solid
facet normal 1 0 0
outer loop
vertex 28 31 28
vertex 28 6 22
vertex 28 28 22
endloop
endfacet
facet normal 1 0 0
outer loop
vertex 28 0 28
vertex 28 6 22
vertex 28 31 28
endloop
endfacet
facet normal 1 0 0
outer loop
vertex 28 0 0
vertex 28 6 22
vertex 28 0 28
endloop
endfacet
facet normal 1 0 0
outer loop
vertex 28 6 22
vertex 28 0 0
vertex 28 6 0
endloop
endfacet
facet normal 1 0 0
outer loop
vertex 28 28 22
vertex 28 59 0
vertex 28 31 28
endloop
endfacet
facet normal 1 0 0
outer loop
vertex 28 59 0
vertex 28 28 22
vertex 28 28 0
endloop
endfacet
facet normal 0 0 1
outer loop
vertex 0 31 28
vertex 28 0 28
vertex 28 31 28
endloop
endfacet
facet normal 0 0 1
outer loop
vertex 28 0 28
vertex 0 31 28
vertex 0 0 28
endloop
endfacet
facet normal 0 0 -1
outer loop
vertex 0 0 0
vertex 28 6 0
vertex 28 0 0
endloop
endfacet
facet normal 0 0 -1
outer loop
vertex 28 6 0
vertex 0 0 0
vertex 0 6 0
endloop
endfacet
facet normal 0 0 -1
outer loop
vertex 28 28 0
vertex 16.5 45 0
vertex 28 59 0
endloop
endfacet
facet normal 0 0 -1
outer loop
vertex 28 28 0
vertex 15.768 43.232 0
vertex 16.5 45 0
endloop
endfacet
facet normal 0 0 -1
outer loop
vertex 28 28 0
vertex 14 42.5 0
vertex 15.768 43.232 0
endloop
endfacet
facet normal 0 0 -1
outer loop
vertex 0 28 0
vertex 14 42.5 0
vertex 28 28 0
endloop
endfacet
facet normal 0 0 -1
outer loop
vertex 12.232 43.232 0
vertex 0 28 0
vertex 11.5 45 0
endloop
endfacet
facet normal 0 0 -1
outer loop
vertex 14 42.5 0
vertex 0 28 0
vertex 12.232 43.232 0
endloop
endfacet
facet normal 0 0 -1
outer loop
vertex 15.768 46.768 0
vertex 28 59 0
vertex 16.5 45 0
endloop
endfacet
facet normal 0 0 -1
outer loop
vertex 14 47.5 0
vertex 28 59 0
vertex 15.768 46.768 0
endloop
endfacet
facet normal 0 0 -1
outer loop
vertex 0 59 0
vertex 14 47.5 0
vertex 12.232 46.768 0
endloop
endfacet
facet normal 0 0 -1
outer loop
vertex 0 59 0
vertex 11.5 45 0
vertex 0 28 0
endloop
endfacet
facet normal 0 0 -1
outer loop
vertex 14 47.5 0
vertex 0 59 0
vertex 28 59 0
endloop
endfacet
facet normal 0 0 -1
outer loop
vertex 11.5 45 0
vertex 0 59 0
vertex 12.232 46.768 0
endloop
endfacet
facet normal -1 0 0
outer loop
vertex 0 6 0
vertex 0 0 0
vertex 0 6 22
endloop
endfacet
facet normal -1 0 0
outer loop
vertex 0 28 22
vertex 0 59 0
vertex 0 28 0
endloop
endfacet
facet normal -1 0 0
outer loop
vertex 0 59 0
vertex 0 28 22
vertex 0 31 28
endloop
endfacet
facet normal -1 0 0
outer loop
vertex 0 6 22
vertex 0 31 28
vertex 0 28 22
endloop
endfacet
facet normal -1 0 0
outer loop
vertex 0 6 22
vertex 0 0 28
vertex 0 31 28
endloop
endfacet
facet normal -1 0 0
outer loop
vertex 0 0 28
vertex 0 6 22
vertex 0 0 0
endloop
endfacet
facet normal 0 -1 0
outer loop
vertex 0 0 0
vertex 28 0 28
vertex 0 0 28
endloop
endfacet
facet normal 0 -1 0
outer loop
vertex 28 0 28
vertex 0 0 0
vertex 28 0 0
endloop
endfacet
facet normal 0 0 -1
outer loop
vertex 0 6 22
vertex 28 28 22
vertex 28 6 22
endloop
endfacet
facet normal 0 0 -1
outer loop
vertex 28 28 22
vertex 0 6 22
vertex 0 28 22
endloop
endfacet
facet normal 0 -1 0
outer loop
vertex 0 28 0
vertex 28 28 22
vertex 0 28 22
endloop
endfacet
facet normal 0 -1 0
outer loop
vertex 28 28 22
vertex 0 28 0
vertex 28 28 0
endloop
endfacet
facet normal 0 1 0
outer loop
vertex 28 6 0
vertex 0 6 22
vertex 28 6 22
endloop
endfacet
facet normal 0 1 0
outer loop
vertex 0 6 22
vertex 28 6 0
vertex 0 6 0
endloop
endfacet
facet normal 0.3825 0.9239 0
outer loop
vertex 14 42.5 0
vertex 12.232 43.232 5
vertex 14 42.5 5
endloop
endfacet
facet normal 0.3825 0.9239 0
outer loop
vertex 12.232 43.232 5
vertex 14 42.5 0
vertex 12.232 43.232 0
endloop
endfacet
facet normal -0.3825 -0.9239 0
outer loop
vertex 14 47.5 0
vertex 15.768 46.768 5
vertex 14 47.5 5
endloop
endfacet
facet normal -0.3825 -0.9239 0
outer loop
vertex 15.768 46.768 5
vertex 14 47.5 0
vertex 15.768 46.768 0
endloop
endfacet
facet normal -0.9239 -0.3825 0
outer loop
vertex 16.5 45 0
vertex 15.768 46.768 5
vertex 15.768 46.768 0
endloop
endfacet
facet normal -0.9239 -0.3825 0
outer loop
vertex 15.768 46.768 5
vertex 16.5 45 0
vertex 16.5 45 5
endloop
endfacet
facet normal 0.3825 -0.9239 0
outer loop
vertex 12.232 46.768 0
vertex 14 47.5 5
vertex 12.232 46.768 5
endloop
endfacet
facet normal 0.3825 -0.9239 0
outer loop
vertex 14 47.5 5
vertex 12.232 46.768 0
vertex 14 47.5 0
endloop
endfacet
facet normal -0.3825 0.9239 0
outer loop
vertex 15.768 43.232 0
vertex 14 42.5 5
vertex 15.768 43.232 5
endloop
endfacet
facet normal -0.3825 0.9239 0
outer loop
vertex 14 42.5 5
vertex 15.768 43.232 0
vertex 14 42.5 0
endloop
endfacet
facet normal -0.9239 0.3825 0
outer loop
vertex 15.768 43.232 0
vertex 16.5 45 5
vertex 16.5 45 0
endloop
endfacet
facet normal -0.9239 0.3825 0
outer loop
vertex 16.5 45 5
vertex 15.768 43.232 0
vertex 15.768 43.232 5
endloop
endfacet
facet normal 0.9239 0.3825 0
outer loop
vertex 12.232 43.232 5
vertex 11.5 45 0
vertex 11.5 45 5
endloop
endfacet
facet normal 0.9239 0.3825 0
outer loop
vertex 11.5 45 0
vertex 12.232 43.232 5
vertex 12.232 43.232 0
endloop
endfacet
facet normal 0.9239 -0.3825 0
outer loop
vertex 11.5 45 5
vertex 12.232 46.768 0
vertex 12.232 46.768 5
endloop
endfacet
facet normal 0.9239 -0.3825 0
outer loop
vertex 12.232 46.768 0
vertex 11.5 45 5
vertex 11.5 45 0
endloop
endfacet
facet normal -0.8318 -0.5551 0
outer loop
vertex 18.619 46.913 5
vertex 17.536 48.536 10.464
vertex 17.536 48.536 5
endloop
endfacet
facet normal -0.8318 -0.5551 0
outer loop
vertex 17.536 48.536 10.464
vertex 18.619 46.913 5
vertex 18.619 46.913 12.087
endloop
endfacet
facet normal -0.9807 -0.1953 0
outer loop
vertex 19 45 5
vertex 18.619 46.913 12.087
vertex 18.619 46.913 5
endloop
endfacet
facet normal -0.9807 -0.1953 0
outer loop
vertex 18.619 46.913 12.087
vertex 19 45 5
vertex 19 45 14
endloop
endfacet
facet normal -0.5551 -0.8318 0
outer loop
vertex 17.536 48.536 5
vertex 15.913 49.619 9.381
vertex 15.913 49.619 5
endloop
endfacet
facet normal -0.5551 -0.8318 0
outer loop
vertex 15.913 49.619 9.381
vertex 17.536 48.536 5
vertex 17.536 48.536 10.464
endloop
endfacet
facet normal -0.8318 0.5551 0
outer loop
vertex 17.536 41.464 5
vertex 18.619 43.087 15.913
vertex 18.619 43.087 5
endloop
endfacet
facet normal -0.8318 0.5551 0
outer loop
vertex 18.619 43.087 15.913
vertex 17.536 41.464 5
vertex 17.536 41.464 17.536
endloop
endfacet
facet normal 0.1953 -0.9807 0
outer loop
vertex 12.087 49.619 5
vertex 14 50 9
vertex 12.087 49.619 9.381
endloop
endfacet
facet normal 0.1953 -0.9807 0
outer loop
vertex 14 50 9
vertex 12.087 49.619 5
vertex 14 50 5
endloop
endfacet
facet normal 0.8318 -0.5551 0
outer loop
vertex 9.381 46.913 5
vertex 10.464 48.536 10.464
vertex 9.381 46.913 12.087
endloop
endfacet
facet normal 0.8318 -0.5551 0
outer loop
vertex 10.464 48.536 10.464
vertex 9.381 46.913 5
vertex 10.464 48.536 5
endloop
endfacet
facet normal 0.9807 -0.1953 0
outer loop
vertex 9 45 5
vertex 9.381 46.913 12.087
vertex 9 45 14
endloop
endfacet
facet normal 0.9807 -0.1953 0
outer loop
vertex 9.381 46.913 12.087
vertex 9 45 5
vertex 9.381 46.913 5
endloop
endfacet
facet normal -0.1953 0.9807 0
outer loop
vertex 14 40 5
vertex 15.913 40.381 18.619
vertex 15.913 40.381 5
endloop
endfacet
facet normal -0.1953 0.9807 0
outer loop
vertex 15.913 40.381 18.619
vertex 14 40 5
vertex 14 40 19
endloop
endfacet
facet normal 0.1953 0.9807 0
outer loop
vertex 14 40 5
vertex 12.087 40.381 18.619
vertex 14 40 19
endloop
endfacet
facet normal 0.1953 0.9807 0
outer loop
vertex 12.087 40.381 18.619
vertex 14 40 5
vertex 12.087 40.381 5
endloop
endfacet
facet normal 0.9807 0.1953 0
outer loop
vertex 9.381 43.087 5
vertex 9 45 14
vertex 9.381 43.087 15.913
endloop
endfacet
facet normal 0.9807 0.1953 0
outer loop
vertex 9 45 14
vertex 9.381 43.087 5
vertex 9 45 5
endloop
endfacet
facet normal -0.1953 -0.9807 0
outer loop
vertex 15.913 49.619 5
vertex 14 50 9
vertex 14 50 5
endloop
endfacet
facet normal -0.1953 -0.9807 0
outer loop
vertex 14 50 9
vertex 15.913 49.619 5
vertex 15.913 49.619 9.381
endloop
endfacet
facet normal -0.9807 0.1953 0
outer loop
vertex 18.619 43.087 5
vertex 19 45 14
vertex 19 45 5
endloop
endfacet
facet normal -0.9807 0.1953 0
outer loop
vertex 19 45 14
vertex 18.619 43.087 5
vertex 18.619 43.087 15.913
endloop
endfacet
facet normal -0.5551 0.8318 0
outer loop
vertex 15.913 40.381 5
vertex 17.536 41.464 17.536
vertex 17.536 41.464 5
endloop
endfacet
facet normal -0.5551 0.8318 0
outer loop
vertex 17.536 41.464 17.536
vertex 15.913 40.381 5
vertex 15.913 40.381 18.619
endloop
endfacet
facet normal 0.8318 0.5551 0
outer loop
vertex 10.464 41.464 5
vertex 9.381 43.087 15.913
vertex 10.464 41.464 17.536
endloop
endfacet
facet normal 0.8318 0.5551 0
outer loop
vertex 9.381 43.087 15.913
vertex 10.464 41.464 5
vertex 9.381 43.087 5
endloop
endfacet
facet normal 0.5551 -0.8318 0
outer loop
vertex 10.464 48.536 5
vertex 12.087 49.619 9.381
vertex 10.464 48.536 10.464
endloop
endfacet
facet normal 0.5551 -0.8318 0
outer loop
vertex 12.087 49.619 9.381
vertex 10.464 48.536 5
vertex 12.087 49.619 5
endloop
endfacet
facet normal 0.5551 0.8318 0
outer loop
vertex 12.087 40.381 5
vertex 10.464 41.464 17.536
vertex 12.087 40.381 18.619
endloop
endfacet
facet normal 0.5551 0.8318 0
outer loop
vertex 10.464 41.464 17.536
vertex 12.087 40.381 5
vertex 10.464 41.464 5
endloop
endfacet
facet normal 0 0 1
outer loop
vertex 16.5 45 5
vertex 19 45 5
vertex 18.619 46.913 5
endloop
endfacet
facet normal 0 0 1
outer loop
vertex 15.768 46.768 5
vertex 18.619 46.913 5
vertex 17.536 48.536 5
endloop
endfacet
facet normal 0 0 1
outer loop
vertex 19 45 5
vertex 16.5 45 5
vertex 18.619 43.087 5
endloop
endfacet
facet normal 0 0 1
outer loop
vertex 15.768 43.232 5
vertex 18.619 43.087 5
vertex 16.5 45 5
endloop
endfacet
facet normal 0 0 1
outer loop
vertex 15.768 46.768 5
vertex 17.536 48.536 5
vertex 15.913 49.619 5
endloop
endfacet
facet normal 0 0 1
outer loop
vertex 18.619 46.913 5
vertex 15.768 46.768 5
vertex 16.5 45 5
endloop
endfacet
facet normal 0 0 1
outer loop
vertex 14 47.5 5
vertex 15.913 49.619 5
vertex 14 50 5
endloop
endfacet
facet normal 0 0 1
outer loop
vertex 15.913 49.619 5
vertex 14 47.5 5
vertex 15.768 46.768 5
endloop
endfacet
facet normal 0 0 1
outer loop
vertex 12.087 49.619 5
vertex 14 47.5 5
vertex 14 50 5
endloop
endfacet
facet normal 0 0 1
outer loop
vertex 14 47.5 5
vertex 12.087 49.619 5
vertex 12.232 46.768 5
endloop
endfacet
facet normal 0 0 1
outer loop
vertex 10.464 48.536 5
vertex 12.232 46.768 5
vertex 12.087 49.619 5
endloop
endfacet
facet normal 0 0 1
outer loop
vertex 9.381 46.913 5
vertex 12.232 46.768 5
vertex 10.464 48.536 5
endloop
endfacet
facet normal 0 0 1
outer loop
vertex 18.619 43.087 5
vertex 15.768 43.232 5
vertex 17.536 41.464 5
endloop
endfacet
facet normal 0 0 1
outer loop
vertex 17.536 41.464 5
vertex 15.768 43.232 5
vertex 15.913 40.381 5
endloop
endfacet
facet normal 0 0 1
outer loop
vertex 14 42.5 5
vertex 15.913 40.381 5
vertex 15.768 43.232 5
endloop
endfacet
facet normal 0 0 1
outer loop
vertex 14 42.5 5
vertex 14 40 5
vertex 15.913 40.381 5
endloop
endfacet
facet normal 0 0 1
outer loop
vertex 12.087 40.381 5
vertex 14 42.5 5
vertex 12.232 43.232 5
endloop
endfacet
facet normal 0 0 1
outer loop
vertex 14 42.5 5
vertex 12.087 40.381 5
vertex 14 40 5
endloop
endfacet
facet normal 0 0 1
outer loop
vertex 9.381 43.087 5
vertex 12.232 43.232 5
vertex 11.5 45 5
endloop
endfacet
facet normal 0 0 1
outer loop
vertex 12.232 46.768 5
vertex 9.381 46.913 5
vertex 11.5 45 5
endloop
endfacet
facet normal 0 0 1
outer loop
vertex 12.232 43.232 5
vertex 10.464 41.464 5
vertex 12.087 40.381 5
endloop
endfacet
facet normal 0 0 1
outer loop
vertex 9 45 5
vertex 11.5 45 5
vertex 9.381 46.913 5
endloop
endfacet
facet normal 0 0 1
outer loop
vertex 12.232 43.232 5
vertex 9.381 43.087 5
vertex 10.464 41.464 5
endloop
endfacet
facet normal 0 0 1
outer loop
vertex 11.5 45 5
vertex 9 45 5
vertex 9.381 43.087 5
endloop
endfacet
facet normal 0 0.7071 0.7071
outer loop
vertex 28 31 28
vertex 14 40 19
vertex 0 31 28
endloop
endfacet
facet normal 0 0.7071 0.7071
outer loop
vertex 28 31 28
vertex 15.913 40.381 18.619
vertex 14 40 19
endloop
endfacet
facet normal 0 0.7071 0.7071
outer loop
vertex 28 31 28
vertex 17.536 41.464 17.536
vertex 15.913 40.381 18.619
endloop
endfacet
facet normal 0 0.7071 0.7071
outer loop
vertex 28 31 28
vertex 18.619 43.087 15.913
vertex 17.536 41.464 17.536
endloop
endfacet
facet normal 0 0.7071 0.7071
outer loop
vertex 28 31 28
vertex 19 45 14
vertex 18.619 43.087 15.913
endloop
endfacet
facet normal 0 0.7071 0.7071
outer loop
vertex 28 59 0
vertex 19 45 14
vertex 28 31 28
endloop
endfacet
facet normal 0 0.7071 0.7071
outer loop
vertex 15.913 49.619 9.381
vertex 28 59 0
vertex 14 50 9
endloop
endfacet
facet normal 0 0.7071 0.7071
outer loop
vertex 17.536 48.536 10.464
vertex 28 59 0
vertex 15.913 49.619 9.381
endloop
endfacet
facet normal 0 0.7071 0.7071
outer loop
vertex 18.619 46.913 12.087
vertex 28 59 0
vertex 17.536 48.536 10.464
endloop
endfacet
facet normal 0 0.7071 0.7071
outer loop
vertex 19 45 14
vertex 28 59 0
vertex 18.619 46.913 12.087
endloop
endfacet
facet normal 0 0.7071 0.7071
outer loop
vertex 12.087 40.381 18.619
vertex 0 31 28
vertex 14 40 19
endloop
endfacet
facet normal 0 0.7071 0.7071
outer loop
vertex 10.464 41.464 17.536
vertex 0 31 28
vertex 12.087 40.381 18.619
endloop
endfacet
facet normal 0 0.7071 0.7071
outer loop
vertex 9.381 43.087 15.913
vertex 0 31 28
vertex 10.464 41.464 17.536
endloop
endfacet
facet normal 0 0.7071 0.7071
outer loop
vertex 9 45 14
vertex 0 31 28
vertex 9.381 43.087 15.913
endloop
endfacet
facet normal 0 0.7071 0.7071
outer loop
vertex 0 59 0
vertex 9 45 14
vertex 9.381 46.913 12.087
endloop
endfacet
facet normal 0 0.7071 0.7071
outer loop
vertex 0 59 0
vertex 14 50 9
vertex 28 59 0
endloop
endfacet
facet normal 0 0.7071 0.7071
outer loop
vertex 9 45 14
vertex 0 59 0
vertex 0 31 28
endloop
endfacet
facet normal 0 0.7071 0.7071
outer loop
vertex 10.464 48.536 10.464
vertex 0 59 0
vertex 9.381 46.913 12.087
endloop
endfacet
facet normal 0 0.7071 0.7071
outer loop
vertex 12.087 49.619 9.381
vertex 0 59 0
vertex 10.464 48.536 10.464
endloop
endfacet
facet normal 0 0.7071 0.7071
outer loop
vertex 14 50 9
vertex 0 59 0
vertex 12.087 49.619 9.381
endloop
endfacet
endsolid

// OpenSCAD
thickness = 6;
clamp_height = 22;
clamp_width = 22;
clamp_depth = 28;

height = clamp_height + thickness;
width = clamp_width + 1.5 * thickness;
depth = clamp_depth;

screw_dia = 5;
screw_head_dia = 10;
screw_lip_height = 5;

mount_height = height;
mount_depth = clamp_depth;
mount_width = clamp_depth;


union() {
    difference() {
        cube([depth, width, height]);
        translate([-1, thickness, -1])
            cube([clamp_depth + 2, clamp_width, clamp_height + 1]);
    }
    translate([0, width, 0])
    difference() {
        polyhedron(points = [[0, 0, 0],
                             [0, mount_width, 0],
                             [0, 0, mount_height],
                             [mount_depth, 0, 0],
                             [mount_depth, mount_width, 0],
                             [mount_depth, 0, mount_height]],
                   faces = [[0,1,2],
                            [4,3,5],
                            [0,2,5,3],
                            [4,5,2,1],
                            [0,3,4,1]]);
        union() {
            translate([mount_depth/2, mount_width/2, -1])
                cylinder(d = screw_dia, h = mount_height + 2);
            translate([mount_depth/2, mount_width/2, screw_lip_height])
                cylinder(d = screw_head_dia, h = mount_height +2);
        }
    }
}
